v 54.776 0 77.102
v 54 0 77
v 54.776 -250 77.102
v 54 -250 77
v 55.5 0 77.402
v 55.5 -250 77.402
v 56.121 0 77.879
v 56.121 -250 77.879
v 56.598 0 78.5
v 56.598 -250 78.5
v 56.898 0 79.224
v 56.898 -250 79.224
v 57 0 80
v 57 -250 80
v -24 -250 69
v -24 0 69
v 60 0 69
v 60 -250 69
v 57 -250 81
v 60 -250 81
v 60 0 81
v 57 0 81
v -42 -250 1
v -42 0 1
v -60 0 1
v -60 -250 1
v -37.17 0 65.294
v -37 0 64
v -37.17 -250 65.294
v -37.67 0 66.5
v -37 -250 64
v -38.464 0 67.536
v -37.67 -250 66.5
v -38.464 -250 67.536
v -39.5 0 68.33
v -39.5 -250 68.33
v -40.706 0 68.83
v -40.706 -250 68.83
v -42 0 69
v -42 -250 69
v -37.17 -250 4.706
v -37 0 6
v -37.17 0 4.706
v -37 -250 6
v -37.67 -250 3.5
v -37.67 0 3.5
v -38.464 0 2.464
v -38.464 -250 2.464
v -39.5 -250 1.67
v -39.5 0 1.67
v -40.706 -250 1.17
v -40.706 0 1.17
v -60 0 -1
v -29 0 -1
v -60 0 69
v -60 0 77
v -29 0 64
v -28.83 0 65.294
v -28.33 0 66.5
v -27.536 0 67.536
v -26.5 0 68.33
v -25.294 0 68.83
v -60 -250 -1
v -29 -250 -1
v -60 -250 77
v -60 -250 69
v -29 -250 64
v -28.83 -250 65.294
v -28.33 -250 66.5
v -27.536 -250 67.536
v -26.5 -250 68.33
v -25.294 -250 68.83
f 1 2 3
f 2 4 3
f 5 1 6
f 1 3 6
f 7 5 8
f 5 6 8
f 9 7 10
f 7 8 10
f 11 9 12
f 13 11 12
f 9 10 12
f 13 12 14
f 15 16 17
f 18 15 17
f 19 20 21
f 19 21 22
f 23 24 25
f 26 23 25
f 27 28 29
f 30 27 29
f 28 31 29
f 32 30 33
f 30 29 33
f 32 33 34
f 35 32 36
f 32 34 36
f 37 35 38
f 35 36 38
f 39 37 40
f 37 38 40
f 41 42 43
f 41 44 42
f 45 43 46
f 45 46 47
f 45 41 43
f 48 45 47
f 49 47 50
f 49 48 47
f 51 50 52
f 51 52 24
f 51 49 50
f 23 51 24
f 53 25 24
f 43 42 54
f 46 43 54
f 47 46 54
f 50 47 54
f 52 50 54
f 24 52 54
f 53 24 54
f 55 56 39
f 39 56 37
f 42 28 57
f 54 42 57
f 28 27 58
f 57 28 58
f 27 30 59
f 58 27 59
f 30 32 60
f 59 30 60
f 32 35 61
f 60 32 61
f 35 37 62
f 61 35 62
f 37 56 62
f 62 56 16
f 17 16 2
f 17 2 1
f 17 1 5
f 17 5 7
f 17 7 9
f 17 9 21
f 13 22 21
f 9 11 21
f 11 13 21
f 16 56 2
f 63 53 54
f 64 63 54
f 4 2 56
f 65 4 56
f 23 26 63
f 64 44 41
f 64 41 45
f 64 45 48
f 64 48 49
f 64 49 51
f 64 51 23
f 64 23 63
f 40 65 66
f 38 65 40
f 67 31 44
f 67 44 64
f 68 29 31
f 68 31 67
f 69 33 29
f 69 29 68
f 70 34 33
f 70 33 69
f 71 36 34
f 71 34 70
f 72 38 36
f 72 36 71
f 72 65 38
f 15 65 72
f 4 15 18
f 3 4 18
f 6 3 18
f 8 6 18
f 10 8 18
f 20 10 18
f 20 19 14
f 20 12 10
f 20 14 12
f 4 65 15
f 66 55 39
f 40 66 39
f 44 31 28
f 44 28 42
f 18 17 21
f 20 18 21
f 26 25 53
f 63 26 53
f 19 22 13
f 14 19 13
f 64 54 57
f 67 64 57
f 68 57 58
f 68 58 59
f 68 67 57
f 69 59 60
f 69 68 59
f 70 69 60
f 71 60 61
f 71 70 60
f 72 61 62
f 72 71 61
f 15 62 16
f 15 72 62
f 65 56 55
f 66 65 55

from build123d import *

# Parameters (mm, degrees)
PAD_DEPTH   = 250
FILLET_R    = 5
FILLET001_R = 5
FILLET002_R = 5
FILLET003_R = 3


with BuildPart() as part:
    # Sketch → Pad (new body)
    with BuildSketch(Plane.XZ):
        Polygon((57, 77), (-60, 77), (-60, 69), (-37, 69), (-37, 1), (-60, 1), (-60, -1), (-37, -1), (-29, -1), (-29, 69), (60, 69), (60, 77), (60, 81), (57, 81), align=None)
    extrude(amount=PAD_DEPTH)

    # Fillet
    fillet_edges = [part.edges().sort_by_distance(p)[0] for p in [
        (-29, -125, 69),
    ]]
    fillet(fillet_edges, radius=FILLET_R)

    # Fillet001
    fillet001_edges = [part.edges().sort_by_distance(p)[0] for p in [
        (-37, -125, 69),
    ]]
    fillet(fillet001_edges, radius=FILLET001_R)

    # Fillet002
    fillet002_edges = [part.edges().sort_by_distance(p)[0] for p in [
        (-37, -125, 1),
    ]]
    fillet(fillet002_edges, radius=FILLET002_R)

    # Fillet003
    fillet003_edges = [part.edges().sort_by_distance(p)[0] for p in [
        (57, -125, 77),
    ]]
    fillet(fillet003_edges, radius=FILLET003_R)


solid = part.part
